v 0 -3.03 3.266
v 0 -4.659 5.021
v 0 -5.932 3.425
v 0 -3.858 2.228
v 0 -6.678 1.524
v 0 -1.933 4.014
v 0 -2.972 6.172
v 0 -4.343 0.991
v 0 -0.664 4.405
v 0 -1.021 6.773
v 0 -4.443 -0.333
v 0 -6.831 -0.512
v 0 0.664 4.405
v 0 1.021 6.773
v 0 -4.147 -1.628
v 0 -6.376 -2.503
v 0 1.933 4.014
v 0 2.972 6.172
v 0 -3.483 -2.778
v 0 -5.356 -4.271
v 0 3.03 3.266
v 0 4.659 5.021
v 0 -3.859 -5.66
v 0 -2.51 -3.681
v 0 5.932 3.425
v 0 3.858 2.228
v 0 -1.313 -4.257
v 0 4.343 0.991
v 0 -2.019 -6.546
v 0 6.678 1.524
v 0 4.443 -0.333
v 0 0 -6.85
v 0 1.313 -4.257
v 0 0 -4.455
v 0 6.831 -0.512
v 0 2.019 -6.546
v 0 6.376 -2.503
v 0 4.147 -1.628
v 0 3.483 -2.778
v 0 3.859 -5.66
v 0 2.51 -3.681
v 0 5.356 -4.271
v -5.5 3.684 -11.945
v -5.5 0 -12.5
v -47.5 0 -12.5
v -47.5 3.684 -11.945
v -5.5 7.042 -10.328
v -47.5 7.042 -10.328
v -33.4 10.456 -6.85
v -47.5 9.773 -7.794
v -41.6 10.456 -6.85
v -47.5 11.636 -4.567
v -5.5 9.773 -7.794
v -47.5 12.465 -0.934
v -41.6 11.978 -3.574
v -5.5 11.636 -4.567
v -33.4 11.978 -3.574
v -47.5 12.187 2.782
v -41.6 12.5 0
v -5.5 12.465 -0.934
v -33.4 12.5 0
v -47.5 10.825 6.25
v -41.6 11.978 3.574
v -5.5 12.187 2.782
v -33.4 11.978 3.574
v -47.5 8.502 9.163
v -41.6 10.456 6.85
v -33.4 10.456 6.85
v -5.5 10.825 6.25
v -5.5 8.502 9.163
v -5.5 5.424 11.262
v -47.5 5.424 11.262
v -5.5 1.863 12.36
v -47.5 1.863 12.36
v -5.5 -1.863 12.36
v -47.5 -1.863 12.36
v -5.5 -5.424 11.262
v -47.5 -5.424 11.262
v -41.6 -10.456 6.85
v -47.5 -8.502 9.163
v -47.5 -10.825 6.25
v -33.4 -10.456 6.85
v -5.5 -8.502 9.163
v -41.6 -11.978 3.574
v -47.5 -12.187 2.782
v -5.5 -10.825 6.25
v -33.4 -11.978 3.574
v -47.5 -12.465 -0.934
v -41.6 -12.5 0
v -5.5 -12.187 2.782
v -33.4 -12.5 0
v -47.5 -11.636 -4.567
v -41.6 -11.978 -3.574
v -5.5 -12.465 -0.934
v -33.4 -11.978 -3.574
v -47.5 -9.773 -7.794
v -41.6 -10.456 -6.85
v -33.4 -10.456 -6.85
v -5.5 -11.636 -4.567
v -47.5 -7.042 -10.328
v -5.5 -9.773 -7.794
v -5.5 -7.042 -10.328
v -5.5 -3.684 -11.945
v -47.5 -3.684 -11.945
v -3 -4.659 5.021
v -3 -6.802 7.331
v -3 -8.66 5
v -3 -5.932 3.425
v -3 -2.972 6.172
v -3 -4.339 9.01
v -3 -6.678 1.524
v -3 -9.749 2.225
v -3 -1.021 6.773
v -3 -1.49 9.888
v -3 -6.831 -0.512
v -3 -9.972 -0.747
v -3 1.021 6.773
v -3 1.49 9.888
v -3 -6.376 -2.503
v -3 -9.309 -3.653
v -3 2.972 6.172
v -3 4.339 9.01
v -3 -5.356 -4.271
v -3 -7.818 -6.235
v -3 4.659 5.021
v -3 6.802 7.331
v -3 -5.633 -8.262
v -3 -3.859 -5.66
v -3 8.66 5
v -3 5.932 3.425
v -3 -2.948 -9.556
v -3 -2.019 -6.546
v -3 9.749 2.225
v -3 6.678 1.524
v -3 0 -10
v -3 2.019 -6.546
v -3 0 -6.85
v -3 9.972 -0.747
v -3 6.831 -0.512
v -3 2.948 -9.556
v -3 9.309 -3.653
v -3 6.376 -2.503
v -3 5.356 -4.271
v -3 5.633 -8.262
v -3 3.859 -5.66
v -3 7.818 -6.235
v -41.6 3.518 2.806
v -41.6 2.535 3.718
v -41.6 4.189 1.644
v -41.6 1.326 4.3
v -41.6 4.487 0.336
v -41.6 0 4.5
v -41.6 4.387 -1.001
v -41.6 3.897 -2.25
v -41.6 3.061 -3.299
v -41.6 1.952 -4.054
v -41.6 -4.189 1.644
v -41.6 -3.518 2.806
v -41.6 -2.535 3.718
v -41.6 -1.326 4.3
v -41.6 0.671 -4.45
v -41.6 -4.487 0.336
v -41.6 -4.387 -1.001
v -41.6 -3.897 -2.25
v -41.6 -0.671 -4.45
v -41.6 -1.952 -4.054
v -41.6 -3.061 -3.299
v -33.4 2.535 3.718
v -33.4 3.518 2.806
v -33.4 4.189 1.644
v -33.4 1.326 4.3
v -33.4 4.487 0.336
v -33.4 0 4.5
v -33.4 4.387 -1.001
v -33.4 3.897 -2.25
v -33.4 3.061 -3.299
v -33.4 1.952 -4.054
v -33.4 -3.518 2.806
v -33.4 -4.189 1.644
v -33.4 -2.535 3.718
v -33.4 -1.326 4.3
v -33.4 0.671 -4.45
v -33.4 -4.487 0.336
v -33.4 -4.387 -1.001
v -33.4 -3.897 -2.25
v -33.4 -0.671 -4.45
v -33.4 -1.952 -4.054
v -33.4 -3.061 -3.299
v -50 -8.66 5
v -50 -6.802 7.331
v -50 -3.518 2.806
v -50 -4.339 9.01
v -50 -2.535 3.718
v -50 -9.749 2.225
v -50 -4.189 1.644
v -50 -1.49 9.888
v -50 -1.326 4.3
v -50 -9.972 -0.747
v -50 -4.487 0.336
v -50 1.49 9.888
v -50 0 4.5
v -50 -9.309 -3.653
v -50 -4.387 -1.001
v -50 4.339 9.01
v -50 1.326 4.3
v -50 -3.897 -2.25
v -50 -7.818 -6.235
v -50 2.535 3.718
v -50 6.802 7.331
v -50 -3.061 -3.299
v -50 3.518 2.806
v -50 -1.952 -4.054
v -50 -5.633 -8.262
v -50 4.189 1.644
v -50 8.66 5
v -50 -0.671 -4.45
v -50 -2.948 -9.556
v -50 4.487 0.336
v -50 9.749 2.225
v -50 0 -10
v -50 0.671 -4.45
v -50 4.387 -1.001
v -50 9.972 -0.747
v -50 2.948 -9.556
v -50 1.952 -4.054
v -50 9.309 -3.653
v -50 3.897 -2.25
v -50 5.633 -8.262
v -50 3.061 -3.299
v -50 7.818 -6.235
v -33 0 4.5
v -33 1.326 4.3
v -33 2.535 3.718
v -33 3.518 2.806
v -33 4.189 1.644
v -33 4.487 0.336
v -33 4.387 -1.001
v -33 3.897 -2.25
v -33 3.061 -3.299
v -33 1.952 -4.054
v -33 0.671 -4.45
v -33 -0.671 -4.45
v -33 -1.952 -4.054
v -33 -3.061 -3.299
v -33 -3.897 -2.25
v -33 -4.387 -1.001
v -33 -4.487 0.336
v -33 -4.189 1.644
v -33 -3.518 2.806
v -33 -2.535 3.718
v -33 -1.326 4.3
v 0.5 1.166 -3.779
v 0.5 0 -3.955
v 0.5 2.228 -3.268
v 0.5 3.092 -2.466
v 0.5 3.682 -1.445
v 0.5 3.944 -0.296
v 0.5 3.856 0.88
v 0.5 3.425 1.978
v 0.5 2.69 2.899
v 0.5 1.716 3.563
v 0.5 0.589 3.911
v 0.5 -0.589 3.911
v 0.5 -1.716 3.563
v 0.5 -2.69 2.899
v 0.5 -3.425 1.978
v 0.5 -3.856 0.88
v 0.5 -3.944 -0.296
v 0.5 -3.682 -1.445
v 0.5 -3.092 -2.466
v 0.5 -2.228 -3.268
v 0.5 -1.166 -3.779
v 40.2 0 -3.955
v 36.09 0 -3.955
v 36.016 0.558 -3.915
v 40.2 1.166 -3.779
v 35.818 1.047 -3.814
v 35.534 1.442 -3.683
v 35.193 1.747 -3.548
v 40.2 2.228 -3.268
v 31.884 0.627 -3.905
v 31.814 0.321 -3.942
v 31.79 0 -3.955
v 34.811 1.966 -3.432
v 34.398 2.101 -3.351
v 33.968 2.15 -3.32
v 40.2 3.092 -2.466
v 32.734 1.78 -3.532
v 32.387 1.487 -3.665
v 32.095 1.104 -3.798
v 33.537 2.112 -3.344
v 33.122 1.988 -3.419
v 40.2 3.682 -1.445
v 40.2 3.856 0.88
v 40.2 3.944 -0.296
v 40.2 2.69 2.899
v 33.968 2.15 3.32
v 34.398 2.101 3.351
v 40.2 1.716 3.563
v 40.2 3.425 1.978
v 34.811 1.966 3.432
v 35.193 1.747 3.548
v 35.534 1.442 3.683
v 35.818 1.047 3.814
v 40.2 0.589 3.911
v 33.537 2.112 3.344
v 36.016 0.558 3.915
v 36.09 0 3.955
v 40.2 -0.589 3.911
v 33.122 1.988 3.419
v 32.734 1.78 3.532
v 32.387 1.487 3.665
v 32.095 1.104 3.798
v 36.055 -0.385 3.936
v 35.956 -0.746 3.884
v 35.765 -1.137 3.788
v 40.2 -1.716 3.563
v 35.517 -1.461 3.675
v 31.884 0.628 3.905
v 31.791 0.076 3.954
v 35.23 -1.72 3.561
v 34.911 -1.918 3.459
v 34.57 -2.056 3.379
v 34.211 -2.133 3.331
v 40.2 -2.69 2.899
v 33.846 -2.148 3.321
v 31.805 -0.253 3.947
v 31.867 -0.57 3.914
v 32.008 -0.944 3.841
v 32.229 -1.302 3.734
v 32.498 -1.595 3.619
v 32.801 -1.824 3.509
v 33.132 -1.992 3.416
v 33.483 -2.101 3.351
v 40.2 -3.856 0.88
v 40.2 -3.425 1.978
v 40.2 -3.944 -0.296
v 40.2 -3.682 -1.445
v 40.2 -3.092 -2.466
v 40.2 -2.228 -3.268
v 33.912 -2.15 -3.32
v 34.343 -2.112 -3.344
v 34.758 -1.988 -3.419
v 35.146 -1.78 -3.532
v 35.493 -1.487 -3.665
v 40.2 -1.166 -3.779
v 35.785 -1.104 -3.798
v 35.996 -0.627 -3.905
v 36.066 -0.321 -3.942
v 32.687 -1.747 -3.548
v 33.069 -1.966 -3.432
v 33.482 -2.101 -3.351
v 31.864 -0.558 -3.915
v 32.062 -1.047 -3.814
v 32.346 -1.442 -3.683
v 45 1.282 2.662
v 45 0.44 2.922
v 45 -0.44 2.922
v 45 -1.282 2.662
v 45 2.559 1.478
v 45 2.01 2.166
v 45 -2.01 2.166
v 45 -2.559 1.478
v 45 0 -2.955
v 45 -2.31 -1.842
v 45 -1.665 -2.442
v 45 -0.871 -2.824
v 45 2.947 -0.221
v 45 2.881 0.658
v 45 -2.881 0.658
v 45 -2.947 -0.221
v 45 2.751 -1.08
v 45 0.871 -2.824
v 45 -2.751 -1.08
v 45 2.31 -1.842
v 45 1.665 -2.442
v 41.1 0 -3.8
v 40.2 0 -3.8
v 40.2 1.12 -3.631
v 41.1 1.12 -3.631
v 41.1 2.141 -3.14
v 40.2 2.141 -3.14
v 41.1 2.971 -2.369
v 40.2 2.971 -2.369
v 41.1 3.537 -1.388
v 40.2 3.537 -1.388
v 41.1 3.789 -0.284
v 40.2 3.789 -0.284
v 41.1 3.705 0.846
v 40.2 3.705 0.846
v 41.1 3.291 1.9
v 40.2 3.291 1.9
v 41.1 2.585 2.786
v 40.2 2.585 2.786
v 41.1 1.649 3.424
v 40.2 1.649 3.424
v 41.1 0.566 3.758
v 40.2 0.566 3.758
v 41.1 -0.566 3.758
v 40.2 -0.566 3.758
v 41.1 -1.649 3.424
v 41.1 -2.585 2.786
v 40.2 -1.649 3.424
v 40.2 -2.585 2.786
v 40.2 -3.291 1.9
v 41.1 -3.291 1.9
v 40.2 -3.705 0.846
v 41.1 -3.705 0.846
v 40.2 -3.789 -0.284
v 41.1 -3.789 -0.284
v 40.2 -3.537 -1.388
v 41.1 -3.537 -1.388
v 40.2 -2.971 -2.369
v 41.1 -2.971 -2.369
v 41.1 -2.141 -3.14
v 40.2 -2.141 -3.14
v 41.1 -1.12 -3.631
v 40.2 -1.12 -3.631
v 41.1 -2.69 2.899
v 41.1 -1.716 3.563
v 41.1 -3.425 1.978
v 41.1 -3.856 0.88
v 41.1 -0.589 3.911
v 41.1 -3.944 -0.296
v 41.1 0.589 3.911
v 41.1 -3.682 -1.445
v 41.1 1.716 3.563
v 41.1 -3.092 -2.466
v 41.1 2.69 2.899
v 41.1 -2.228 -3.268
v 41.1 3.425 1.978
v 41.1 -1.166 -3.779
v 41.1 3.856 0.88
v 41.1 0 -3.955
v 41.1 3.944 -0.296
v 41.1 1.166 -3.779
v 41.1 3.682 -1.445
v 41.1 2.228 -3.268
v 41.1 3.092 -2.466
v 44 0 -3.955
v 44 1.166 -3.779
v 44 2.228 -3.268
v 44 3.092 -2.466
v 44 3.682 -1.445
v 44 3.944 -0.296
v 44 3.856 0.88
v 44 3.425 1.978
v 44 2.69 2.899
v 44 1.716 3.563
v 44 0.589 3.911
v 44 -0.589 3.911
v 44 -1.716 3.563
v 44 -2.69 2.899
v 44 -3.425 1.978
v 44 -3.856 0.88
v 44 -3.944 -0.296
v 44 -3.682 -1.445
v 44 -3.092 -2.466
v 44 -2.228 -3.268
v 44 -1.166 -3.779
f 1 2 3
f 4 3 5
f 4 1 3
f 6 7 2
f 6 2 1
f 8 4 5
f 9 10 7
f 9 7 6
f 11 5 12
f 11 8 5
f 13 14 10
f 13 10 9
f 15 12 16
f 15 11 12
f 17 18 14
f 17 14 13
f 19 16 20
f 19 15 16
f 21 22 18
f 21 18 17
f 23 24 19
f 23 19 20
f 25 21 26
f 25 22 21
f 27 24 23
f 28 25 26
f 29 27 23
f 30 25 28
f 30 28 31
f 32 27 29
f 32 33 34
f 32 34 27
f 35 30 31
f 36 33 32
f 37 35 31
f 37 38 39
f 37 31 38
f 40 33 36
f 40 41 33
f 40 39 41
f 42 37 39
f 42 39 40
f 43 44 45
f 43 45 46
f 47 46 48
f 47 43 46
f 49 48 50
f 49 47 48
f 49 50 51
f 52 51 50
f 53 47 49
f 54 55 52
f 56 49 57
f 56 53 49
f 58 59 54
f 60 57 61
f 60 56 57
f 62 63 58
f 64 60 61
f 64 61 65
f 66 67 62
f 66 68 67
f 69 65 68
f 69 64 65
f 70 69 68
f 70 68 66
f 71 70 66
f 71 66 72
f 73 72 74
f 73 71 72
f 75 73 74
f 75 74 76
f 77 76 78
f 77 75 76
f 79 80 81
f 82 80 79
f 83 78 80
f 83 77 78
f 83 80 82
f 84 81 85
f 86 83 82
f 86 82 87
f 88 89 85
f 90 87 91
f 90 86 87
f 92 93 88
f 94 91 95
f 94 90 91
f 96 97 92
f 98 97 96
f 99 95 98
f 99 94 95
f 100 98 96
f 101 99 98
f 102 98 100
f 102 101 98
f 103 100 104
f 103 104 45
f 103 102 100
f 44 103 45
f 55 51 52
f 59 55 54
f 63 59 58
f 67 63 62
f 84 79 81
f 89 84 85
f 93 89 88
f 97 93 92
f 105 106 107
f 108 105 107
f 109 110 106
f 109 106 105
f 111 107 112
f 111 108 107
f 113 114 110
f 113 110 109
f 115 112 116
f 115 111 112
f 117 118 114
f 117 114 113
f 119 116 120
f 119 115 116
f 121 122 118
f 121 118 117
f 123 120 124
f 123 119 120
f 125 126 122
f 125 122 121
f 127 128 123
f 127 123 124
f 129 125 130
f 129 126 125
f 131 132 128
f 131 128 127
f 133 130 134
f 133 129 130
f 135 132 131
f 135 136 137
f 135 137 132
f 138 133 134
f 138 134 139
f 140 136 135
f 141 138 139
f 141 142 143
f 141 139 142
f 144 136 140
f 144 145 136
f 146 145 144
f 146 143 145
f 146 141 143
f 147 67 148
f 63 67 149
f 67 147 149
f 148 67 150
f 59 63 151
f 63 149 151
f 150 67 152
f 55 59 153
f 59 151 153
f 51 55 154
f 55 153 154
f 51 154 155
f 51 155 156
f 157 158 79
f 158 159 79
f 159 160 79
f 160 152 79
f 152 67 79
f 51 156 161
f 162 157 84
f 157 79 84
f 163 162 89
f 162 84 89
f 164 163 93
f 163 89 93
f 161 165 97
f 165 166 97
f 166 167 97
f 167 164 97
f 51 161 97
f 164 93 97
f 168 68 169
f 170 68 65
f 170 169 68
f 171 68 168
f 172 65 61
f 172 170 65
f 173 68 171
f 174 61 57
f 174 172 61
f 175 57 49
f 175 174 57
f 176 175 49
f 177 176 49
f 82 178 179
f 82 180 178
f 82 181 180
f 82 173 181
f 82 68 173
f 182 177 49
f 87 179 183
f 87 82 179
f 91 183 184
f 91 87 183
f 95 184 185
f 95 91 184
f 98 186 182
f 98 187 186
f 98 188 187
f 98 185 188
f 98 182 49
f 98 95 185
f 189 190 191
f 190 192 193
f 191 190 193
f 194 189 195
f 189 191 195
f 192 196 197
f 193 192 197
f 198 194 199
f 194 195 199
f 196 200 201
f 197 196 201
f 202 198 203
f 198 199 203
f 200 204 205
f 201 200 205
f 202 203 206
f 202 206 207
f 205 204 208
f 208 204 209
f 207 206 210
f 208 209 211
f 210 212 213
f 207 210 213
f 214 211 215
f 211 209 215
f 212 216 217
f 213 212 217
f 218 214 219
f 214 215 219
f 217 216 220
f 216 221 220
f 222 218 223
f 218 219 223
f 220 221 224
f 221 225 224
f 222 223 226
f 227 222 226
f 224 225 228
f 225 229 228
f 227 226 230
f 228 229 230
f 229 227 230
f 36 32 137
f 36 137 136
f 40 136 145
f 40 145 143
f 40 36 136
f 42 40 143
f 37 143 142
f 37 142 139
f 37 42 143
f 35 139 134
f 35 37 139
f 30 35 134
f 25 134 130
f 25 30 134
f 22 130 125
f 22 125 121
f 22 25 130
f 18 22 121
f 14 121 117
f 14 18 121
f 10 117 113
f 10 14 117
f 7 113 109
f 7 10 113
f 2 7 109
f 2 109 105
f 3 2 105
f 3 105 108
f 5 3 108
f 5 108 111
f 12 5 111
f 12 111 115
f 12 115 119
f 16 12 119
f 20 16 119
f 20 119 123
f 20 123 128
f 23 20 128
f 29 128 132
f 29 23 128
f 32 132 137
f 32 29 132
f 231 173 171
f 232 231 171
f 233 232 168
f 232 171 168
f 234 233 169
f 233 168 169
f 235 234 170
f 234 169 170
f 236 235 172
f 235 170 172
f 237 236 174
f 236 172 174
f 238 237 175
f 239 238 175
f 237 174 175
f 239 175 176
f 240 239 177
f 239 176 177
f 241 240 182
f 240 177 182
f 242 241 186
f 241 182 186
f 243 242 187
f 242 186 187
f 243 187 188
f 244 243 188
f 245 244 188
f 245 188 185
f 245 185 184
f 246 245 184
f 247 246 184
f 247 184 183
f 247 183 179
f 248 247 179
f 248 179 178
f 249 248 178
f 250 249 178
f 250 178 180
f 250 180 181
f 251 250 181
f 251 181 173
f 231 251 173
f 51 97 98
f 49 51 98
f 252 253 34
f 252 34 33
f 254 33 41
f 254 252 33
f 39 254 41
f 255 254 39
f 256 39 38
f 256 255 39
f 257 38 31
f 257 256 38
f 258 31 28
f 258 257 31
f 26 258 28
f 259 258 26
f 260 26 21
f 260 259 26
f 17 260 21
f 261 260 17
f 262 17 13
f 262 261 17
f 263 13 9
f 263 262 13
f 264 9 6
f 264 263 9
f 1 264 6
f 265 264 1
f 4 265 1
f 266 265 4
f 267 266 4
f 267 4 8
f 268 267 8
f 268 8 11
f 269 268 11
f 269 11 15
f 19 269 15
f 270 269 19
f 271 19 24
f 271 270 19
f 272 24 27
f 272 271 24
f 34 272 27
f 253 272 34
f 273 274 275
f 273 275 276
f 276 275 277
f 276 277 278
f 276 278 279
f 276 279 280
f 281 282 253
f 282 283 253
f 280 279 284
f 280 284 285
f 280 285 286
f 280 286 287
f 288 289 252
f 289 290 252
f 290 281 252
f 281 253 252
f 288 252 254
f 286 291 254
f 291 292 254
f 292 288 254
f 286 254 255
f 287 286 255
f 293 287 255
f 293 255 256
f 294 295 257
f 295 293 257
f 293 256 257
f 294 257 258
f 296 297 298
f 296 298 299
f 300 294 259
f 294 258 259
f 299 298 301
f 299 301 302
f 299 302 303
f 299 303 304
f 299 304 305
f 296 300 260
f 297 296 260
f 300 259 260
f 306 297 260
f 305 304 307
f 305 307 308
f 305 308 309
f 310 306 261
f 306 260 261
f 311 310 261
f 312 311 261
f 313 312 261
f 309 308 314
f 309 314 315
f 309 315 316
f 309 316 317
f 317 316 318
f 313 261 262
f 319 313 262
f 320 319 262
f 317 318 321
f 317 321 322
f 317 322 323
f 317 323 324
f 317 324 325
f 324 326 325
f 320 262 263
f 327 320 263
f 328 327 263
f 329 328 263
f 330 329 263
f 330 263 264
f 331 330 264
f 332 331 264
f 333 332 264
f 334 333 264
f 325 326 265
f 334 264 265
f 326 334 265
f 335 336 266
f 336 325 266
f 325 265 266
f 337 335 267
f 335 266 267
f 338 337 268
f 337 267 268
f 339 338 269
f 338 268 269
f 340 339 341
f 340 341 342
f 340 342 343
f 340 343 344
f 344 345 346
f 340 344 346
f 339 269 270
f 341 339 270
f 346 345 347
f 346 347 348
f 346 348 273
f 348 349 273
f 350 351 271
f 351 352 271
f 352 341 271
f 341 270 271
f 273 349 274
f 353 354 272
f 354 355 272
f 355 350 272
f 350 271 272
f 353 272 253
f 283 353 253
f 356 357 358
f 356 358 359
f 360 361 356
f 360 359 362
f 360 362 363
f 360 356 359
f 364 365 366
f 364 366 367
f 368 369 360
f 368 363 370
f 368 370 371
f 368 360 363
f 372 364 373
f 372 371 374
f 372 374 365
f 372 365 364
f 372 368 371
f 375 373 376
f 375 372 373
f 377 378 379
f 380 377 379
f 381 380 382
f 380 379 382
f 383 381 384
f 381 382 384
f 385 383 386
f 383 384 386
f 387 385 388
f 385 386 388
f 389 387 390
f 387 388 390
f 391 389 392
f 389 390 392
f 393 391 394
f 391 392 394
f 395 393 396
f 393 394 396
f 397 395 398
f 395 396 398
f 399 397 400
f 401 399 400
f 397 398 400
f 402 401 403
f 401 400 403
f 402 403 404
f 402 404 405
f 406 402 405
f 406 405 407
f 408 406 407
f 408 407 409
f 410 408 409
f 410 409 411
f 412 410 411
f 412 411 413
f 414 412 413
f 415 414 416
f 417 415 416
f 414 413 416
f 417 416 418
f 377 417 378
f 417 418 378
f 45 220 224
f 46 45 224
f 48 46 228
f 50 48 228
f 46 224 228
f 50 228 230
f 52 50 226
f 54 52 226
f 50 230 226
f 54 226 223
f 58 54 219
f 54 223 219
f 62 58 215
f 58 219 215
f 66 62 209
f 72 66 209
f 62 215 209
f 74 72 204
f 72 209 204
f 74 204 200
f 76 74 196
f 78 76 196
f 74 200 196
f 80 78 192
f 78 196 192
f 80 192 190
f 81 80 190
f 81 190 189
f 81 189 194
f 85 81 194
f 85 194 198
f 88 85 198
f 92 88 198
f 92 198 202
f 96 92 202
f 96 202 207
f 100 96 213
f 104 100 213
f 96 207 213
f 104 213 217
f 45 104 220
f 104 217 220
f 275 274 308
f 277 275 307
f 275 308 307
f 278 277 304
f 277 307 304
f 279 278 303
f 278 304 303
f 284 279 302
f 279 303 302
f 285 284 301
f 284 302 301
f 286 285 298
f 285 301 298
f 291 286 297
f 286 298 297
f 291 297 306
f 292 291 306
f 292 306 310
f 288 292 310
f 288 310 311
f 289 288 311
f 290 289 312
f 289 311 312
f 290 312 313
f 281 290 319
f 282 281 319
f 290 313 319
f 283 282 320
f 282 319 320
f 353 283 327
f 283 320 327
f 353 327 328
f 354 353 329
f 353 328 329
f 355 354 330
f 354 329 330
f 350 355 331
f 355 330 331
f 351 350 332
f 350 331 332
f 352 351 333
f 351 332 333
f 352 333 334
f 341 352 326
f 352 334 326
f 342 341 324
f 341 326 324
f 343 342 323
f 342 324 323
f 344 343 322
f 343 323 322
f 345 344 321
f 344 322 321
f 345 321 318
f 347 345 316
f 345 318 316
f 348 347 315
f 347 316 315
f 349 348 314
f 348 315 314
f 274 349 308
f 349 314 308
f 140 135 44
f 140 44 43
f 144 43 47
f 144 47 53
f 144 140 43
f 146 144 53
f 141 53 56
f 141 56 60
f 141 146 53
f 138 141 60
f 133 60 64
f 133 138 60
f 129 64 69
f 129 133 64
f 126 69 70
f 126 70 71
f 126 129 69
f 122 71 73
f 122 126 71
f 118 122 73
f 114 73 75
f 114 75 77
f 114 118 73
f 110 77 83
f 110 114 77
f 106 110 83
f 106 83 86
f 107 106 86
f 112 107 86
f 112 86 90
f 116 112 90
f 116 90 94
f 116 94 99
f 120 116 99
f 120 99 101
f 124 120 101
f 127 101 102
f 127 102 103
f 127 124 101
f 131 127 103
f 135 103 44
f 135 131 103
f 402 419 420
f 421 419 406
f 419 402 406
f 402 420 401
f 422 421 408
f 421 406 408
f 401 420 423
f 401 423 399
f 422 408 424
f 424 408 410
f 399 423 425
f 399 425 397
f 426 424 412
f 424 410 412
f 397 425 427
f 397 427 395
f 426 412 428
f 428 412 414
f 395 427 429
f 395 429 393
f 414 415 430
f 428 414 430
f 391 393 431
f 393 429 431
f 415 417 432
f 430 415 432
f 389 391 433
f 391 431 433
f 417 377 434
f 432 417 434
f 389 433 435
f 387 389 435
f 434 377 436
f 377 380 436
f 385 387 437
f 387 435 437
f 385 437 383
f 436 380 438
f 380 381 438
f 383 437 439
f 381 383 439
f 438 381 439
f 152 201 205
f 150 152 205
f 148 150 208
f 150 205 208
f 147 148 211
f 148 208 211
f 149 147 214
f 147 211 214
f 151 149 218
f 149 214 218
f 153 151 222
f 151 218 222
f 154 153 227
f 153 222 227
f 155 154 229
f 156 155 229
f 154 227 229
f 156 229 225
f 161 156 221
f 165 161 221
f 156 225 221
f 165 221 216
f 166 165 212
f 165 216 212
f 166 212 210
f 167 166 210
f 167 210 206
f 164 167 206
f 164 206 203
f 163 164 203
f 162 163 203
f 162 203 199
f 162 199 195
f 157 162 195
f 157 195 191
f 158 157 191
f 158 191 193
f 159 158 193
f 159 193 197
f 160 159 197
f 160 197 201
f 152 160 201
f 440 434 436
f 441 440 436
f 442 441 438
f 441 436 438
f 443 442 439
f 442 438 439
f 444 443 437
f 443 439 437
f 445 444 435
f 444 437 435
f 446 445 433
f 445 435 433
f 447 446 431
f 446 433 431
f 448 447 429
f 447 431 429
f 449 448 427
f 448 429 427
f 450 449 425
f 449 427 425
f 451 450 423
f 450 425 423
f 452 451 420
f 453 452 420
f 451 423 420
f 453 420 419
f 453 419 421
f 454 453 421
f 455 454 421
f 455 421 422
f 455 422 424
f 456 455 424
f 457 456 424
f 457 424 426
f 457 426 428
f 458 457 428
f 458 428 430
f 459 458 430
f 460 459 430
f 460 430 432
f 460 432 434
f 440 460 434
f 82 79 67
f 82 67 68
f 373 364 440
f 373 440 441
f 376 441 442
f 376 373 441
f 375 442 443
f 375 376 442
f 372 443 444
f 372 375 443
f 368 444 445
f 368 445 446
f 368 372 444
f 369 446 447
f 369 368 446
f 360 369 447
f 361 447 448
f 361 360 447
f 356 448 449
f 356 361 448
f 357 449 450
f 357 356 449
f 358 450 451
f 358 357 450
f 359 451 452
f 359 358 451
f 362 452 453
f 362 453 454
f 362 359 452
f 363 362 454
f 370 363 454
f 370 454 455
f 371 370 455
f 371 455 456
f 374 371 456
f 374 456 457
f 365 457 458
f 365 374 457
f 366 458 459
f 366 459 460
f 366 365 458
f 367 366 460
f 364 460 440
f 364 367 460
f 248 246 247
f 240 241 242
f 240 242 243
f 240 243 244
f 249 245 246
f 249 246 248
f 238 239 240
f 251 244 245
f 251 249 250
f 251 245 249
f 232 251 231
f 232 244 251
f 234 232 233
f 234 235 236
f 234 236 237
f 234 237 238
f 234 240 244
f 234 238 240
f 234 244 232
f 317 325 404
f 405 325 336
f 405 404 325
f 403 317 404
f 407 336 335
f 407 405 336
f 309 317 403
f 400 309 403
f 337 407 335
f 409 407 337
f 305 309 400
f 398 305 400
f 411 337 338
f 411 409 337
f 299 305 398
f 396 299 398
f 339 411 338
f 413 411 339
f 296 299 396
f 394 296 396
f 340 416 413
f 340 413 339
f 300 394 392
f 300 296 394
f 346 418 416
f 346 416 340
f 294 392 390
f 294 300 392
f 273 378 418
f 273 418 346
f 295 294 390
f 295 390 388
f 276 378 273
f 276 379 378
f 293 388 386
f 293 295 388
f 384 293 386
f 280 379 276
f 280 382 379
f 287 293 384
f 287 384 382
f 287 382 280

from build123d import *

# Parameters (mm, degrees)
SKETCH1_R               = 12.5
BOSS_EXTRUDE1_DEPTH     = 50
SKETCH6_R               = 12.5
SKETCH6_R_2             = 6.85
CUT_EXTRUDE4_DEPTH      = 3
SKETCH7_R               = 3.955
BOSS_EXTRUDE3_DEPTH     = 45
SKETCH8_R               = 2.15
CUT_EXTRUDE5_DEPTH      = 13.5
CUT_EXTRUDE5_DEPTH_BACK = 13.5
SKETCH9_R               = 3.97
SKETCH9_R_2             = 3.8
CUT_EXTRUDE6_DEPTH      = 0.9
SKETCH10_R              = 4
CUT_EXTRUDE7_DEPTH      = 20
CHAMFER2_SIZE           = 2.5
CHAMFER3_SIZE           = 2.5
CHAMFER4_SIZE           = 1
SKETCH2_R               = 8.963089754
BOSS_EXTRUDE2_DEPTH     = 35
SKETCH12_R              = 9.5
SKETCH12_R_2            = 4.5
BOSS_EXTRUDE4_DEPTH     = 9
SKETCH11_W              = 8.2
SKETCH11_H              = 13.7
CUT_EXTRUDE8_DEPTH      = 13.5
CUT_EXTRUDE8_DEPTH_BACK = 13.5
SKETCH13_R              = 4.5
CUT_EXTRUDE9_DEPTH      = 17
CHAMFER5_SIZE           = 0.5


with BuildPart() as part:
    # Sketch1 → Boss-Extrude1 (new body)
    with BuildSketch(Plane(origin=(0, 0, 0), x_dir=(0, 0, -1), z_dir=(1, 0, 0))):
        Circle(SKETCH1_R)
    extrude(amount=-BOSS_EXTRUDE1_DEPTH)

    # Sketch6 → Cut-Extrude4 (cut)
    with BuildSketch(Plane(origin=(0, 0, 0), x_dir=(0, 0, -1), z_dir=(1, 0, 0))):
        Circle(SKETCH6_R)
        Circle(SKETCH6_R_2, mode=Mode.SUBTRACT)
    extrude(amount=-CUT_EXTRUDE4_DEPTH, mode=Mode.SUBTRACT)

    # Sketch7 → Boss-Extrude3 (add)
    with BuildSketch(Plane(origin=(0, 0, 0), x_dir=(0, 0, -1), z_dir=(1, 0, 0))):
        Circle(SKETCH7_R)
    extrude(amount=BOSS_EXTRUDE3_DEPTH)

    # Sketch8 → Cut-Extrude5 (cut, two sides)
    with BuildSketch(Plane.XY) as cut_extrude5_sk:
        with Locations((33.94, 0)):
            Circle(SKETCH8_R)
    extrude(amount=CUT_EXTRUDE5_DEPTH, mode=Mode.SUBTRACT)
    extrude(cut_extrude5_sk.sketch, amount=-CUT_EXTRUDE5_DEPTH_BACK, mode=Mode.SUBTRACT)

    # Sketch9 → Cut-Extrude6 (cut)
    with BuildSketch(Plane(origin=(40.2, 0, 0), x_dir=(0, 0, -1), z_dir=(1, 0, 0))):
        Circle(SKETCH9_R)
        Circle(SKETCH9_R_2, mode=Mode.SUBTRACT)
    extrude(amount=CUT_EXTRUDE6_DEPTH, mode=Mode.SUBTRACT)

    # Sketch10 → Cut-Extrude7 (cut)
    with BuildSketch(Plane.ZY.offset(50)):
        Circle(SKETCH10_R)
    extrude(amount=-CUT_EXTRUDE7_DEPTH, mode=Mode.SUBTRACT)

    # Chamfer2
    chamfer2_edges = [part.edges().sort_by_distance(p)[0] for p in [
        (-50, 0, 12.5),
    ]]
    chamfer(chamfer2_edges, length=CHAMFER2_SIZE)

    # Chamfer3
    chamfer3_edges = [part.edges().sort_by_distance(p)[0] for p in [
        (-3, 0, 12.5),
    ]]
    chamfer(chamfer3_edges, length=CHAMFER3_SIZE)

    # Chamfer4
    chamfer4_edges = [part.edges().sort_by_distance(p)[0] for p in [
        (45, 0, 3.955),
    ]]
    chamfer(chamfer4_edges, length=CHAMFER4_SIZE)

    # Sketch2 → Boss-Extrude2 (add)
    with BuildSketch(Plane.ZY.offset(50)):
        Circle(SKETCH2_R)
    extrude(amount=-BOSS_EXTRUDE2_DEPTH)

    # Sketch12 → Boss-Extrude4 (add)
    with BuildSketch(Plane.ZY.offset(50)):
        Circle(SKETCH12_R)
        Circle(SKETCH12_R_2, mode=Mode.SUBTRACT)
    extrude(amount=-BOSS_EXTRUDE4_DEPTH)

    # Sketch11 → Cut-Extrude8 (cut, two sides)
    with BuildSketch(Plane(origin=(0, 0, 0), x_dir=(1, 0, 0), z_dir=(0, 1, 0))) as cut_extrude8_sk:
        with Locations((-37.5, 0)):
            Rectangle(SKETCH11_W, SKETCH11_H)
    extrude(amount=CUT_EXTRUDE8_DEPTH, mode=Mode.SUBTRACT)
    extrude(cut_extrude8_sk.sketch, amount=-CUT_EXTRUDE8_DEPTH_BACK, mode=Mode.SUBTRACT)

    # Sketch13 → Cut-Extrude9 (cut)
    with BuildSketch(Plane.ZY.offset(50)):
        Circle(SKETCH13_R)
    extrude(amount=-CUT_EXTRUDE9_DEPTH, mode=Mode.SUBTRACT)

    # Chamfer5
    chamfer5_edges = [part.edges().sort_by_distance(p)[0] for p in [
        (0, 0, 3.955),
    ]]
    chamfer(chamfer5_edges, length=CHAMFER5_SIZE)


solid = part.part
